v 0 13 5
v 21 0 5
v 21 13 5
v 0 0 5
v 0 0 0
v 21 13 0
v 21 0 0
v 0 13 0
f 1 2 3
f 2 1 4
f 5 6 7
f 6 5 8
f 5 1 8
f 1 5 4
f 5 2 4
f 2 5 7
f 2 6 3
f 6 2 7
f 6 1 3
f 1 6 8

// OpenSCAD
translate([3.5, 1.5, 2.5]) color([0.10728537706325991, 0.8996256313138141, 0.6100819970747507]) cube([7, 3, 5], center=true);
translate([10.5, 1.5, 2.5]) color([0.7890377134172993, 0.7110679469752405, 0.7774643558396669]) cube([7, 3, 5], center=true);
translate([17.5, 1.5, 2.5]) color([0.5140354678382717, 0.46207744282607, 0.6343562920465169]) cube([7, 3, 5], center=true);
translate([3.5, 4.5, 2.5]) color([0.27254621857246664, 0.016558424522952975, 0.6148716567717017]) cube([7, 3, 5], center=true);
translate([8.0, 4.5, 2.5]) color([0.7119066573597548, 0.17257617960039529, 0.41465974039415787]) cube([2, 3, 5], center=true);
translate([10.0, 4.5, 2.5]) color([0.21806470516739018, 0.8797884787327306, 0.9971497033508181]) cube([2, 3, 5], center=true);
translate([12.0, 4.5, 2.5]) color([0.006439244314443648, 0.5355241113549698, 0.428269623660265]) cube([2, 3, 5], center=true);
translate([14.0, 4.5, 2.5]) color([0.0497703561320445, 0.3846945959716809, 0.27248481749180187]) cube([2, 3, 5], center=true);
translate([16.0, 4.5, 2.5]) color([0.9711494351721061, 0.5646669518865992, 0.22956269737245216]) cube([2, 3, 5], center=true);
translate([18.0, 4.5, 2.5]) color([0.7165492601952248, 0.5466375027642284, 0.2821670936164109]) cube([2, 3, 5], center=true);
translate([20.0, 4.5, 2.5]) color([0.7398695784196249, 0.9015687423954613, 0.06478718309218656]) cube([2, 3, 5], center=true);
translate([1.5, 9.5, 2.5]) color([0.3075184499818515, 0.32730937178137276, 0.373196919474838]) cube([3, 7, 5], center=true);
translate([4.5, 9.5, 2.5]) color([0.48026967262350795, 0.5820603979481933, 0.1372879505883815]) cube([3, 7, 5], center=true);
translate([7.5, 9.5, 2.5]) color([0.015498761483451418, 0.5048497045627587, 0.36698725510709684]) cube([3, 7, 5], center=true);
translate([10.5, 9.5, 2.5]) color([0.6348155217266559, 0.811995686067811, 0.8768405645756486]) cube([3, 7, 5], center=true);
translate([13.5, 9.5, 2.5]) color([0.1552431358080847, 0.1767648869043179, 0.991228648099722]) cube([3, 7, 5], center=true);
translate([16.5, 9.5, 2.5]) color([0.13558077637136434, 0.20650423900368708, 0.9151210693627757]) cube([3, 7, 5], center=true);
translate([19.5, 9.5, 2.5]) color([0.49673738754911745, 0.7672539256192649, 0.969306850533619]) cube([3, 7, 5], center=true);
